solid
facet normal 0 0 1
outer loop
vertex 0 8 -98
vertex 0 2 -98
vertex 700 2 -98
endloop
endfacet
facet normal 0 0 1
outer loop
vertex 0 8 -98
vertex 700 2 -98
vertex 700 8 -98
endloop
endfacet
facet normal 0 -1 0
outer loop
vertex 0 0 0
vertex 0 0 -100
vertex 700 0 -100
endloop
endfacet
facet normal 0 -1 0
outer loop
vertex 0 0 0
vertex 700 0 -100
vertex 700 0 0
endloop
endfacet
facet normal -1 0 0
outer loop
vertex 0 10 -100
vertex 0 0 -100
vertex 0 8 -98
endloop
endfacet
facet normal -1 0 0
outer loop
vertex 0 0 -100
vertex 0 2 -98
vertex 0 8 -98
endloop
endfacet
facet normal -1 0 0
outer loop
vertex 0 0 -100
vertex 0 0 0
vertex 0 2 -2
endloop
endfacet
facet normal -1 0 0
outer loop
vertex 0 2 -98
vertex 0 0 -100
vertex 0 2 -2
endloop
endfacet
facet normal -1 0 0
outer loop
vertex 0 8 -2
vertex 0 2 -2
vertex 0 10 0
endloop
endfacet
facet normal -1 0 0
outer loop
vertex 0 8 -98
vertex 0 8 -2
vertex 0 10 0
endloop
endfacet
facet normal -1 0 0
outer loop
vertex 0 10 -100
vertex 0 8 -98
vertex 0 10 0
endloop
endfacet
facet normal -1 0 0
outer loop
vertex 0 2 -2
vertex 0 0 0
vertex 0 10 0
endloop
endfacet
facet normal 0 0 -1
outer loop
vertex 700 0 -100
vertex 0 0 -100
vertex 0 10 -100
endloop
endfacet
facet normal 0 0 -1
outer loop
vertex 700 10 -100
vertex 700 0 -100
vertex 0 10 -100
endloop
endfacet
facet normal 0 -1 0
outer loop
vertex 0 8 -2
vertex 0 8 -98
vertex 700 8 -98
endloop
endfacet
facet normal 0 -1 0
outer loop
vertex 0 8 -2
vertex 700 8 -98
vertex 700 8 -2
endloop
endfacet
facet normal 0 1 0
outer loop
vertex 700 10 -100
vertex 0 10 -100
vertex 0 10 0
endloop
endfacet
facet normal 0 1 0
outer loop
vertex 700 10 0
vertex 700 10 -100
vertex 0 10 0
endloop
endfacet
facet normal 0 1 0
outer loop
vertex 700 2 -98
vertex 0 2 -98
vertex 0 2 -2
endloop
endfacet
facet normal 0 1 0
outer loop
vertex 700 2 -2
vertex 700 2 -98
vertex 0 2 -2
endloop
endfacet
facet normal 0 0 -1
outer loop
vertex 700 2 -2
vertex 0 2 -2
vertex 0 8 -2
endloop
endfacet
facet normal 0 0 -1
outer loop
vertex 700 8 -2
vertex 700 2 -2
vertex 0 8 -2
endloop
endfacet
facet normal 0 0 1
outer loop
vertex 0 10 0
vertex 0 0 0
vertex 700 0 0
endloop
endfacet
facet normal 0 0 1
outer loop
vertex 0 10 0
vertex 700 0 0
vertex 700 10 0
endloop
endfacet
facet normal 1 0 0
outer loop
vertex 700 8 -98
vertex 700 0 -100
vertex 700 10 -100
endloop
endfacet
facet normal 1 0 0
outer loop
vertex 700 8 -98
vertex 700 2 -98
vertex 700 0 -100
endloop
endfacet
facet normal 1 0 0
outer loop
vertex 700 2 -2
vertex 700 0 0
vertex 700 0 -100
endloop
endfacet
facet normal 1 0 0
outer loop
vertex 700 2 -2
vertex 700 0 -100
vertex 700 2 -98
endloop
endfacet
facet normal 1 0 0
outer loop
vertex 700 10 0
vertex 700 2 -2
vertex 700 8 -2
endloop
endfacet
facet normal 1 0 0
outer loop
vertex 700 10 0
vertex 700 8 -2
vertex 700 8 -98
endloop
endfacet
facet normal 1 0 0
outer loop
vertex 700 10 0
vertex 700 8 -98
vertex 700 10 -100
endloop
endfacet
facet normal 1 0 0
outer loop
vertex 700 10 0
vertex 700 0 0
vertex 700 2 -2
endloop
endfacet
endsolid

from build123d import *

# Parameters (mm, degrees)
SKETCH_W   = 10
SKETCH_H   = 100
SKETCH_W_2 = 6
SKETCH_H_2 = 96
PAD_DEPTH  = 700


with BuildPart() as part:
    # Sketch → Pad (new body)
    with BuildSketch(Plane.YZ):
        with Locations((5, -50)):
            Rectangle(SKETCH_W, SKETCH_H)
        with Locations((5, -50)):
            Rectangle(SKETCH_W_2, SKETCH_H_2, mode=Mode.SUBTRACT)
    extrude(amount=PAD_DEPTH)


solid = part.part
